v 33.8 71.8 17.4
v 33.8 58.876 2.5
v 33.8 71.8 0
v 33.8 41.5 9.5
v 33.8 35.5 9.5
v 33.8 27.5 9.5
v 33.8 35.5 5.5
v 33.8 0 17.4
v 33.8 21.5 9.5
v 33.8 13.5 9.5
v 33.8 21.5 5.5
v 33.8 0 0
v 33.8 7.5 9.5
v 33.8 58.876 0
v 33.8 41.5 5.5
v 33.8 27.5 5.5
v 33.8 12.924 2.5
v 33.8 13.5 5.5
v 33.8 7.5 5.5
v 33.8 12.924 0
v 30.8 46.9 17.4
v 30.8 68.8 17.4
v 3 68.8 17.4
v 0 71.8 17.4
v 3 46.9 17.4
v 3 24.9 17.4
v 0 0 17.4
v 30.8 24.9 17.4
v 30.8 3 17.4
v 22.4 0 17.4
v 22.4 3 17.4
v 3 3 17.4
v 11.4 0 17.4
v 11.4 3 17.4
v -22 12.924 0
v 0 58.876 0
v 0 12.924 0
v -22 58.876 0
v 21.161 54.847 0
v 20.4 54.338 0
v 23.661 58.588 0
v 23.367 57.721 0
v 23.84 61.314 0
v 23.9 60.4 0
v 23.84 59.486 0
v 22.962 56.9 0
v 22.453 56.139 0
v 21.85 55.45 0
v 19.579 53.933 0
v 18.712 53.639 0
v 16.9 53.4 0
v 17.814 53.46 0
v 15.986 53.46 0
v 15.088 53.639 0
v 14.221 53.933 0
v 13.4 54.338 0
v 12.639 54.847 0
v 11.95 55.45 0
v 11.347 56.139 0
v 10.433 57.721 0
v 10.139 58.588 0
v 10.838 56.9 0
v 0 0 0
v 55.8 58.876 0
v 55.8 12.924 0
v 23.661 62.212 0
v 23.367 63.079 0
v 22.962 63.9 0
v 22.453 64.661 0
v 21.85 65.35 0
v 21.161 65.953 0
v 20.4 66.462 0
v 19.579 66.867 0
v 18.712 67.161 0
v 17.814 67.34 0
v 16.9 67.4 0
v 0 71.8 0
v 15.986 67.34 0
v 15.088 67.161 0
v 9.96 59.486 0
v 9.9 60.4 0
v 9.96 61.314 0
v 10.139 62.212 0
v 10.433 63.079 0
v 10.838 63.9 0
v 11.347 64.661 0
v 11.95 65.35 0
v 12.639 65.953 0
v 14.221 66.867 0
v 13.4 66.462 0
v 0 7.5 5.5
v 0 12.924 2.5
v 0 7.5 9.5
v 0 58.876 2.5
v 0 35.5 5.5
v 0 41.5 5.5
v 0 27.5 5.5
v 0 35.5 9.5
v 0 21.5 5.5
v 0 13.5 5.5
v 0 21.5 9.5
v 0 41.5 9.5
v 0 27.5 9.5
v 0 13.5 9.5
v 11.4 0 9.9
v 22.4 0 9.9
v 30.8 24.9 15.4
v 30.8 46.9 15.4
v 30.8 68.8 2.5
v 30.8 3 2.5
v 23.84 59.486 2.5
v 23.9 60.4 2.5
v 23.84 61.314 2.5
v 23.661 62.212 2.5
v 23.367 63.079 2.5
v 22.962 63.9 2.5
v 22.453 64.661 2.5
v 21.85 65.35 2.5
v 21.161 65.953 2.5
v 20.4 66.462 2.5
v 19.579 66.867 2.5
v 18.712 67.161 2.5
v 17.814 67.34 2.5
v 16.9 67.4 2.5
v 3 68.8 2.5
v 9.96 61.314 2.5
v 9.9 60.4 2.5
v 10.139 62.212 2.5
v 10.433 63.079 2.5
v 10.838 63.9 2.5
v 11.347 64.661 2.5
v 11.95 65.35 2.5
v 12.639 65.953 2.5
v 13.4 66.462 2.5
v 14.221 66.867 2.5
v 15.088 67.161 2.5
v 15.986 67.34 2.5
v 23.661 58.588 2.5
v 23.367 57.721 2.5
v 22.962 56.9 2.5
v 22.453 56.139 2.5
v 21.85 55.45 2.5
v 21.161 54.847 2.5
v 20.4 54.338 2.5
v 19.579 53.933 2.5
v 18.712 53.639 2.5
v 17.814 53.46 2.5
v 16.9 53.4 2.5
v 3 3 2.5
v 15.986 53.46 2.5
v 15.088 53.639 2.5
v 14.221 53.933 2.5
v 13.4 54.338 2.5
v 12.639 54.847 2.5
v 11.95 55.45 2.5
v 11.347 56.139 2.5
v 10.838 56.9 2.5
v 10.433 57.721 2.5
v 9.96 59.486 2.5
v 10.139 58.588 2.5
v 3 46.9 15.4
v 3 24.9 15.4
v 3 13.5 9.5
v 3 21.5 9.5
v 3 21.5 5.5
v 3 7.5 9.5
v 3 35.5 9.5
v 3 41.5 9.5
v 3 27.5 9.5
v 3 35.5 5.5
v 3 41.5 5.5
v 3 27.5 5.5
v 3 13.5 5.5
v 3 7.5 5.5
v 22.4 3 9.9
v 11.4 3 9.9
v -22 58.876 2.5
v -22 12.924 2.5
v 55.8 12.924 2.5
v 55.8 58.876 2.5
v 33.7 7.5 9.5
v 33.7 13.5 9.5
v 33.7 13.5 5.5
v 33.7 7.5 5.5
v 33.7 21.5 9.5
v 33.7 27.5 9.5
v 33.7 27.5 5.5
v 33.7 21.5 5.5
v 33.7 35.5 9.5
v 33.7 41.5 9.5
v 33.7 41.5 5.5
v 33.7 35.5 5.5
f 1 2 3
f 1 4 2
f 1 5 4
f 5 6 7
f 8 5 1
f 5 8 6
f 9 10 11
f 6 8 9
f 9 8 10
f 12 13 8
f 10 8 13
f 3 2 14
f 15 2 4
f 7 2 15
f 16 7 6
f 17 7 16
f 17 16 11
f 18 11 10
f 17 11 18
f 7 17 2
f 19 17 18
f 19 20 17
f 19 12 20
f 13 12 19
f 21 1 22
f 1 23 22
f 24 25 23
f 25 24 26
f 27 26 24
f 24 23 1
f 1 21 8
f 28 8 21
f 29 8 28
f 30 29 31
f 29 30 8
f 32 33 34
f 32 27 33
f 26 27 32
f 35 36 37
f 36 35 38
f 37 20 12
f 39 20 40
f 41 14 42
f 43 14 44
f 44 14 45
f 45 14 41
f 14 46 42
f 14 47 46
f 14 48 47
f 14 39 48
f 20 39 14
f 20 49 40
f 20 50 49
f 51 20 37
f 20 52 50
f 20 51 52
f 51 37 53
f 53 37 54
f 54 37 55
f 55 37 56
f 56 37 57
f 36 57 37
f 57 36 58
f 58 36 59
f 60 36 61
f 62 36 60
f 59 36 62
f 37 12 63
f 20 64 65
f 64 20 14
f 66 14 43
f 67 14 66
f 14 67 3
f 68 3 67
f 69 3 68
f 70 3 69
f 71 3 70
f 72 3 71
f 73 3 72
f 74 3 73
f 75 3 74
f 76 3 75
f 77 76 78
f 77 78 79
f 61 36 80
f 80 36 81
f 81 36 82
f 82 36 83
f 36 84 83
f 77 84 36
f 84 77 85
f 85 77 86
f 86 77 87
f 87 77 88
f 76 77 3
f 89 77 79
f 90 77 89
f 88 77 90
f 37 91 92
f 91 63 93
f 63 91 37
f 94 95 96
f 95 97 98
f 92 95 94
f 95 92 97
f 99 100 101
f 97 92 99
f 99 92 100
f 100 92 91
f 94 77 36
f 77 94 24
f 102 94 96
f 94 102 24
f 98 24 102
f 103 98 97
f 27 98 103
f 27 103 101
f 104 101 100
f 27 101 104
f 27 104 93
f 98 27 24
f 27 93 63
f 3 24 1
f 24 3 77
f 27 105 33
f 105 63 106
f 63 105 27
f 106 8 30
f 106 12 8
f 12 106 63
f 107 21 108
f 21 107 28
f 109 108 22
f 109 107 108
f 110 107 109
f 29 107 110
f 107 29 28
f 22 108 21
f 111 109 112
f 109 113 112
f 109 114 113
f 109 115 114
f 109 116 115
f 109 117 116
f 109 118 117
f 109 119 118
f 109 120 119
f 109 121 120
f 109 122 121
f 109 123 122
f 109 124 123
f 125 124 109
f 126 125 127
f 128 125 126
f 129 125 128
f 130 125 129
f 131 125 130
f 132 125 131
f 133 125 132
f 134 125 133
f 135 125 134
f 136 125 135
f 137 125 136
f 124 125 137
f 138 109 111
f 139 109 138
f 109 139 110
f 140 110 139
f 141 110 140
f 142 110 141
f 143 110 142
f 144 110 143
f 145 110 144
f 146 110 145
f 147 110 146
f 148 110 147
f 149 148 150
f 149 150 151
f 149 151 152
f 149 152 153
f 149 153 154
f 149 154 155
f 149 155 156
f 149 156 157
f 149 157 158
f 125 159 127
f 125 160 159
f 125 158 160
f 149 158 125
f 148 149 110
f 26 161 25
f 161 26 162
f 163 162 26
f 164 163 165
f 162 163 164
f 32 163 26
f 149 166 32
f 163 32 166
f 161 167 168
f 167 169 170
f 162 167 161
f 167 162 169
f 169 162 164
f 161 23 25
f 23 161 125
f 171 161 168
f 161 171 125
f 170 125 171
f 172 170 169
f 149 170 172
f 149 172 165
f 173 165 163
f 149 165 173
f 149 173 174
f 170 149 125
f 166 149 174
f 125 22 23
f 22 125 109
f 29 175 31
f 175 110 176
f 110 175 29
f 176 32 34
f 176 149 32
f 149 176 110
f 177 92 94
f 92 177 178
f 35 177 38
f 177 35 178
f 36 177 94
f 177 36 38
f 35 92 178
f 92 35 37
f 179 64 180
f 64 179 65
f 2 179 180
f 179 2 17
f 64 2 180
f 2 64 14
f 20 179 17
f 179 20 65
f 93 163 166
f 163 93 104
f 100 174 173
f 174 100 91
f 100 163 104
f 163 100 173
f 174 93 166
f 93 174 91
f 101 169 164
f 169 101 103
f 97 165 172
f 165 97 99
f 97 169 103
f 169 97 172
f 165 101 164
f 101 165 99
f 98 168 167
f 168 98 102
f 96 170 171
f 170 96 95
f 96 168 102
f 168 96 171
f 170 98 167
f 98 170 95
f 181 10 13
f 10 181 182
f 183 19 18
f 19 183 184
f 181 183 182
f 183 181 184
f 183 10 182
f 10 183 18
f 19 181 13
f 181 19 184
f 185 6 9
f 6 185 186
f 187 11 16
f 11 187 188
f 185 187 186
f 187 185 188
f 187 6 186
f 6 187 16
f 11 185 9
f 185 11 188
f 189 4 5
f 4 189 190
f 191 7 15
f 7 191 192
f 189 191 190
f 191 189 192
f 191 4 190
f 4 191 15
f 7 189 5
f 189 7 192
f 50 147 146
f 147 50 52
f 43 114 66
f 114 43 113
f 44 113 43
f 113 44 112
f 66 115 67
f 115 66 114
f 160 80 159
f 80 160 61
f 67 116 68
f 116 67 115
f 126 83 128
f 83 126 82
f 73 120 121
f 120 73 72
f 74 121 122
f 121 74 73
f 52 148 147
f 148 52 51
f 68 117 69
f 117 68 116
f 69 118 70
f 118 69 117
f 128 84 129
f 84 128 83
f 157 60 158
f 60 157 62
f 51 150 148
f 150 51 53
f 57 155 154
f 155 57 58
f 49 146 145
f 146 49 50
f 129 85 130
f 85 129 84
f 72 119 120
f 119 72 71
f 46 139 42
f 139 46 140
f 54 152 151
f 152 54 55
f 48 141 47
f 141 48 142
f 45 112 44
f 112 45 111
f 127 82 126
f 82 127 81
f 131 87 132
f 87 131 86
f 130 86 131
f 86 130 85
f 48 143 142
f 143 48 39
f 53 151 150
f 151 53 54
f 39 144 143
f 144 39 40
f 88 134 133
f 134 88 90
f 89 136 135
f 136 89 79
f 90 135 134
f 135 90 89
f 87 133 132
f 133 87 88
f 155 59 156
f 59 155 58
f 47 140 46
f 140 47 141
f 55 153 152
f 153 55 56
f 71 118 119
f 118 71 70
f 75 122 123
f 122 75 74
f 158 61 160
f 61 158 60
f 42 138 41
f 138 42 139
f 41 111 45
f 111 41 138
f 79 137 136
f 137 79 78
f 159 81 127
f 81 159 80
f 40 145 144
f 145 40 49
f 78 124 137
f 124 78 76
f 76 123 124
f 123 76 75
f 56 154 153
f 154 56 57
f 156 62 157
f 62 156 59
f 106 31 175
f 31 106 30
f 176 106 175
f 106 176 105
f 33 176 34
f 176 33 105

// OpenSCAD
// esp32cam_garage_mount.scad
// Garage door mount for AI-Thinker ESP32-CAM + ESP32-CAM-MB assembly
//
// ORIENTATION: back face (with lens aperture) goes AGAINST the garage door.
//              Lens aligns with a 16mm hole drilled through the door panel.
//              VHB tape applied to the two side flanges.
//
// PRINT SETTINGS:
//   Material : PETG or ASA (temperature stable in garage)
//   Layer    : 0.20 mm
//   Infill   : 25%, gyroid
//   Walls    : 3 perimeters
//   Supports : None required
//   Est. time: ~50 min at 60 mm/s
//
// HARDWARE:
//   - 3M VHB 5952 (1" wide, gray) automotive tape applied to both flanges
//   - Step/unibit drill bit set to 16mm for garage door hole

$fn = 48;

// ── Board assembly dimensions ────────────────────────────────────────────────
// AI-Thinker ESP32-CAM: 27 × 40.5 × ~4.5 mm (PCB)
// ESP32-CAM-MB:         27 × 24.0 × ~4.0 mm (PCB)
// Stacked total (MB plugged into bottom of CAM via header pins):
BOARD_W  = 27.0;   // PCB width
BOARD_H  = 65.0;   // stacked height (40.5 + 24 + header pin clearance)
BOARD_D  = 14.5;   // max depth including tallest capacitors / antenna on MB

// ── Tolerances & walls ──────────────────────────────────────────────────────
TOL       = 0.4;   // XY fit clearance per side (tune ±0.2 for your printer)
WALL      = 3.0;   // side/top/bottom wall thickness
BACK_W    = 2.5;   // back face thickness (door side)

// ── Derived pocket dims ──────────────────────────────────────────────────────
PKT_W = BOARD_W + TOL * 2;
PKT_H = BOARD_H + TOL * 2;
PKT_D = BOARD_D + TOL;

// ── Outer body ───────────────────────────────────────────────────────────────
OUT_W = PKT_W + WALL * 2;   // total body width
OUT_H = PKT_H + WALL * 2;   // total body height
OUT_D = PKT_D + BACK_W;     // total body depth

// ── VHB tape flanges (left and right of body) ────────────────────────────────
FLANGE_EXT = 22.0;          // flange extension beyond body edge
FLANGE_T   = 2.5;           // flange thickness (coplanar with back face)
FLANGE_Y   = OUT_H * 0.18;  // start Y (skip area near lens)
FLANGE_H   = OUT_H * 0.64;  // flange span height

// ── Lens aperture (OV2640 M12 lens position on ESP32-CAM PCB) ────────────────
// From PCB top-left corner: ~13.5 mm right, ~8 mm down
// If image is mirrored/rotated after print, adjust LENS_PCB_X.
LENS_PCB_X         = 13.5;  // from left edge of PCB
LENS_PCB_Y_FROM_TOP =  8.0;  // from top edge of PCB
LENS_D             = 14.0;  // aperture diameter (M12 barrel is ~12 mm; +2 clearance)

// Lens center in mount coordinates (origin = bottom-left of back face)
LENS_AX = WALL + TOL + LENS_PCB_X;
LENS_AY = OUT_H - WALL - TOL - LENS_PCB_Y_FROM_TOP;

// ── USB notch (bottom opening for ESP32-CAM-MB micro-USB port) ───────────────
USB_W = 11.0;   // micro-USB connector width + clearance
USB_H =  7.5;   // height of notch opening
// USB port centered on board width, at top of MB board = near bottom of assembly
USB_X = WALL + TOL + (BOARD_W - USB_W) / 2;

// ── Retention lips (front-opening lips that keep board from falling out) ──────
LIP_D    = 1.2;   // lip protrusion into pocket
LIP_H    = 2.0;   // lip height
LIP_SPAN = 22.0;  // span of each lip (centered on side wall)

// ────────────────────────────────────────────────────────────────────────────
module esp32cam_mount() {
    difference() {
        union() {
            // Main shell: back face + four walls, open front face
            difference() {
                cube([OUT_W, OUT_H, OUT_D]);
                // Board pocket (open from front = Z-max face)
                translate([WALL, WALL, BACK_W])
                    cube([PKT_W, PKT_H, PKT_D + 1]);
            }

            // Left VHB flange (flush with back face, extends left)
            translate([-FLANGE_EXT, FLANGE_Y, 0])
                cube([FLANGE_EXT, FLANGE_H, FLANGE_T]);

            // Right VHB flange
            translate([OUT_W, FLANGE_Y, 0])
                cube([FLANGE_EXT, FLANGE_H, FLANGE_T]);
        }

        // Lens aperture through back face
        translate([LENS_AX, LENS_AY, -0.1])
            cylinder(d = LENS_D, h = BACK_W + 0.2);

        // USB notch: slot through bottom wall for micro-USB access
        translate([USB_X, -0.1, BACK_W + PKT_D - USB_H])
            cube([USB_W, WALL + 0.2, USB_H + 0.5]);

        // Vent slots, left wall (thermal relief for ESP32 SoC)
        for (i = [0 : 2])
            translate([-0.1, WALL * 2.5 + i * 14, BACK_W + 3])
                cube([WALL + 0.2, 6, 4]);

        // Vent slots, right wall
        for (i = [0 : 2])
            translate([OUT_W - 0.1, WALL * 2.5 + i * 14, BACK_W + 3])
                cube([WALL + 0.2, 6, 4]);
    }

    // Retention lips at front opening (left and right inner walls)
    // These overhang into the pocket to hold board; board press-fits past them.
    translate([WALL - LIP_D,
               OUT_H / 2 - LIP_SPAN / 2,
               BACK_W + PKT_D - LIP_H])
        cube([LIP_D, LIP_SPAN, LIP_H]);

    translate([WALL + PKT_W,
               OUT_H / 2 - LIP_SPAN / 2,
               BACK_W + PKT_D - LIP_H])
        cube([LIP_D, LIP_SPAN, LIP_H]);
}

esp32cam_mount();

// ── Drill guide (separate flat piece, print once and discard after drilling) ──
// Tape to outside of garage door, drill through center circle for lens hole.
// Uncomment the translate below and comment out esp32cam_mount() to generate.

// DOOR_HOLE_D = 16.0;   // step bit target diameter
// translate([OUT_W + 10, 0, 0])
//     difference() {
//         cube([OUT_W, OUT_H, 2]);
//         translate([LENS_AX, LENS_AY, -0.1])
//             cylinder(d = DOOR_HOLE_D, h = 3);
//         // Corner mounting holes for tape (optional)
//         for (x = [5, OUT_W - 5]) for (y = [5, OUT_H - 5])
//             translate([x, y, -0.1]) cylinder(d = 2, h = 3);
//     }
